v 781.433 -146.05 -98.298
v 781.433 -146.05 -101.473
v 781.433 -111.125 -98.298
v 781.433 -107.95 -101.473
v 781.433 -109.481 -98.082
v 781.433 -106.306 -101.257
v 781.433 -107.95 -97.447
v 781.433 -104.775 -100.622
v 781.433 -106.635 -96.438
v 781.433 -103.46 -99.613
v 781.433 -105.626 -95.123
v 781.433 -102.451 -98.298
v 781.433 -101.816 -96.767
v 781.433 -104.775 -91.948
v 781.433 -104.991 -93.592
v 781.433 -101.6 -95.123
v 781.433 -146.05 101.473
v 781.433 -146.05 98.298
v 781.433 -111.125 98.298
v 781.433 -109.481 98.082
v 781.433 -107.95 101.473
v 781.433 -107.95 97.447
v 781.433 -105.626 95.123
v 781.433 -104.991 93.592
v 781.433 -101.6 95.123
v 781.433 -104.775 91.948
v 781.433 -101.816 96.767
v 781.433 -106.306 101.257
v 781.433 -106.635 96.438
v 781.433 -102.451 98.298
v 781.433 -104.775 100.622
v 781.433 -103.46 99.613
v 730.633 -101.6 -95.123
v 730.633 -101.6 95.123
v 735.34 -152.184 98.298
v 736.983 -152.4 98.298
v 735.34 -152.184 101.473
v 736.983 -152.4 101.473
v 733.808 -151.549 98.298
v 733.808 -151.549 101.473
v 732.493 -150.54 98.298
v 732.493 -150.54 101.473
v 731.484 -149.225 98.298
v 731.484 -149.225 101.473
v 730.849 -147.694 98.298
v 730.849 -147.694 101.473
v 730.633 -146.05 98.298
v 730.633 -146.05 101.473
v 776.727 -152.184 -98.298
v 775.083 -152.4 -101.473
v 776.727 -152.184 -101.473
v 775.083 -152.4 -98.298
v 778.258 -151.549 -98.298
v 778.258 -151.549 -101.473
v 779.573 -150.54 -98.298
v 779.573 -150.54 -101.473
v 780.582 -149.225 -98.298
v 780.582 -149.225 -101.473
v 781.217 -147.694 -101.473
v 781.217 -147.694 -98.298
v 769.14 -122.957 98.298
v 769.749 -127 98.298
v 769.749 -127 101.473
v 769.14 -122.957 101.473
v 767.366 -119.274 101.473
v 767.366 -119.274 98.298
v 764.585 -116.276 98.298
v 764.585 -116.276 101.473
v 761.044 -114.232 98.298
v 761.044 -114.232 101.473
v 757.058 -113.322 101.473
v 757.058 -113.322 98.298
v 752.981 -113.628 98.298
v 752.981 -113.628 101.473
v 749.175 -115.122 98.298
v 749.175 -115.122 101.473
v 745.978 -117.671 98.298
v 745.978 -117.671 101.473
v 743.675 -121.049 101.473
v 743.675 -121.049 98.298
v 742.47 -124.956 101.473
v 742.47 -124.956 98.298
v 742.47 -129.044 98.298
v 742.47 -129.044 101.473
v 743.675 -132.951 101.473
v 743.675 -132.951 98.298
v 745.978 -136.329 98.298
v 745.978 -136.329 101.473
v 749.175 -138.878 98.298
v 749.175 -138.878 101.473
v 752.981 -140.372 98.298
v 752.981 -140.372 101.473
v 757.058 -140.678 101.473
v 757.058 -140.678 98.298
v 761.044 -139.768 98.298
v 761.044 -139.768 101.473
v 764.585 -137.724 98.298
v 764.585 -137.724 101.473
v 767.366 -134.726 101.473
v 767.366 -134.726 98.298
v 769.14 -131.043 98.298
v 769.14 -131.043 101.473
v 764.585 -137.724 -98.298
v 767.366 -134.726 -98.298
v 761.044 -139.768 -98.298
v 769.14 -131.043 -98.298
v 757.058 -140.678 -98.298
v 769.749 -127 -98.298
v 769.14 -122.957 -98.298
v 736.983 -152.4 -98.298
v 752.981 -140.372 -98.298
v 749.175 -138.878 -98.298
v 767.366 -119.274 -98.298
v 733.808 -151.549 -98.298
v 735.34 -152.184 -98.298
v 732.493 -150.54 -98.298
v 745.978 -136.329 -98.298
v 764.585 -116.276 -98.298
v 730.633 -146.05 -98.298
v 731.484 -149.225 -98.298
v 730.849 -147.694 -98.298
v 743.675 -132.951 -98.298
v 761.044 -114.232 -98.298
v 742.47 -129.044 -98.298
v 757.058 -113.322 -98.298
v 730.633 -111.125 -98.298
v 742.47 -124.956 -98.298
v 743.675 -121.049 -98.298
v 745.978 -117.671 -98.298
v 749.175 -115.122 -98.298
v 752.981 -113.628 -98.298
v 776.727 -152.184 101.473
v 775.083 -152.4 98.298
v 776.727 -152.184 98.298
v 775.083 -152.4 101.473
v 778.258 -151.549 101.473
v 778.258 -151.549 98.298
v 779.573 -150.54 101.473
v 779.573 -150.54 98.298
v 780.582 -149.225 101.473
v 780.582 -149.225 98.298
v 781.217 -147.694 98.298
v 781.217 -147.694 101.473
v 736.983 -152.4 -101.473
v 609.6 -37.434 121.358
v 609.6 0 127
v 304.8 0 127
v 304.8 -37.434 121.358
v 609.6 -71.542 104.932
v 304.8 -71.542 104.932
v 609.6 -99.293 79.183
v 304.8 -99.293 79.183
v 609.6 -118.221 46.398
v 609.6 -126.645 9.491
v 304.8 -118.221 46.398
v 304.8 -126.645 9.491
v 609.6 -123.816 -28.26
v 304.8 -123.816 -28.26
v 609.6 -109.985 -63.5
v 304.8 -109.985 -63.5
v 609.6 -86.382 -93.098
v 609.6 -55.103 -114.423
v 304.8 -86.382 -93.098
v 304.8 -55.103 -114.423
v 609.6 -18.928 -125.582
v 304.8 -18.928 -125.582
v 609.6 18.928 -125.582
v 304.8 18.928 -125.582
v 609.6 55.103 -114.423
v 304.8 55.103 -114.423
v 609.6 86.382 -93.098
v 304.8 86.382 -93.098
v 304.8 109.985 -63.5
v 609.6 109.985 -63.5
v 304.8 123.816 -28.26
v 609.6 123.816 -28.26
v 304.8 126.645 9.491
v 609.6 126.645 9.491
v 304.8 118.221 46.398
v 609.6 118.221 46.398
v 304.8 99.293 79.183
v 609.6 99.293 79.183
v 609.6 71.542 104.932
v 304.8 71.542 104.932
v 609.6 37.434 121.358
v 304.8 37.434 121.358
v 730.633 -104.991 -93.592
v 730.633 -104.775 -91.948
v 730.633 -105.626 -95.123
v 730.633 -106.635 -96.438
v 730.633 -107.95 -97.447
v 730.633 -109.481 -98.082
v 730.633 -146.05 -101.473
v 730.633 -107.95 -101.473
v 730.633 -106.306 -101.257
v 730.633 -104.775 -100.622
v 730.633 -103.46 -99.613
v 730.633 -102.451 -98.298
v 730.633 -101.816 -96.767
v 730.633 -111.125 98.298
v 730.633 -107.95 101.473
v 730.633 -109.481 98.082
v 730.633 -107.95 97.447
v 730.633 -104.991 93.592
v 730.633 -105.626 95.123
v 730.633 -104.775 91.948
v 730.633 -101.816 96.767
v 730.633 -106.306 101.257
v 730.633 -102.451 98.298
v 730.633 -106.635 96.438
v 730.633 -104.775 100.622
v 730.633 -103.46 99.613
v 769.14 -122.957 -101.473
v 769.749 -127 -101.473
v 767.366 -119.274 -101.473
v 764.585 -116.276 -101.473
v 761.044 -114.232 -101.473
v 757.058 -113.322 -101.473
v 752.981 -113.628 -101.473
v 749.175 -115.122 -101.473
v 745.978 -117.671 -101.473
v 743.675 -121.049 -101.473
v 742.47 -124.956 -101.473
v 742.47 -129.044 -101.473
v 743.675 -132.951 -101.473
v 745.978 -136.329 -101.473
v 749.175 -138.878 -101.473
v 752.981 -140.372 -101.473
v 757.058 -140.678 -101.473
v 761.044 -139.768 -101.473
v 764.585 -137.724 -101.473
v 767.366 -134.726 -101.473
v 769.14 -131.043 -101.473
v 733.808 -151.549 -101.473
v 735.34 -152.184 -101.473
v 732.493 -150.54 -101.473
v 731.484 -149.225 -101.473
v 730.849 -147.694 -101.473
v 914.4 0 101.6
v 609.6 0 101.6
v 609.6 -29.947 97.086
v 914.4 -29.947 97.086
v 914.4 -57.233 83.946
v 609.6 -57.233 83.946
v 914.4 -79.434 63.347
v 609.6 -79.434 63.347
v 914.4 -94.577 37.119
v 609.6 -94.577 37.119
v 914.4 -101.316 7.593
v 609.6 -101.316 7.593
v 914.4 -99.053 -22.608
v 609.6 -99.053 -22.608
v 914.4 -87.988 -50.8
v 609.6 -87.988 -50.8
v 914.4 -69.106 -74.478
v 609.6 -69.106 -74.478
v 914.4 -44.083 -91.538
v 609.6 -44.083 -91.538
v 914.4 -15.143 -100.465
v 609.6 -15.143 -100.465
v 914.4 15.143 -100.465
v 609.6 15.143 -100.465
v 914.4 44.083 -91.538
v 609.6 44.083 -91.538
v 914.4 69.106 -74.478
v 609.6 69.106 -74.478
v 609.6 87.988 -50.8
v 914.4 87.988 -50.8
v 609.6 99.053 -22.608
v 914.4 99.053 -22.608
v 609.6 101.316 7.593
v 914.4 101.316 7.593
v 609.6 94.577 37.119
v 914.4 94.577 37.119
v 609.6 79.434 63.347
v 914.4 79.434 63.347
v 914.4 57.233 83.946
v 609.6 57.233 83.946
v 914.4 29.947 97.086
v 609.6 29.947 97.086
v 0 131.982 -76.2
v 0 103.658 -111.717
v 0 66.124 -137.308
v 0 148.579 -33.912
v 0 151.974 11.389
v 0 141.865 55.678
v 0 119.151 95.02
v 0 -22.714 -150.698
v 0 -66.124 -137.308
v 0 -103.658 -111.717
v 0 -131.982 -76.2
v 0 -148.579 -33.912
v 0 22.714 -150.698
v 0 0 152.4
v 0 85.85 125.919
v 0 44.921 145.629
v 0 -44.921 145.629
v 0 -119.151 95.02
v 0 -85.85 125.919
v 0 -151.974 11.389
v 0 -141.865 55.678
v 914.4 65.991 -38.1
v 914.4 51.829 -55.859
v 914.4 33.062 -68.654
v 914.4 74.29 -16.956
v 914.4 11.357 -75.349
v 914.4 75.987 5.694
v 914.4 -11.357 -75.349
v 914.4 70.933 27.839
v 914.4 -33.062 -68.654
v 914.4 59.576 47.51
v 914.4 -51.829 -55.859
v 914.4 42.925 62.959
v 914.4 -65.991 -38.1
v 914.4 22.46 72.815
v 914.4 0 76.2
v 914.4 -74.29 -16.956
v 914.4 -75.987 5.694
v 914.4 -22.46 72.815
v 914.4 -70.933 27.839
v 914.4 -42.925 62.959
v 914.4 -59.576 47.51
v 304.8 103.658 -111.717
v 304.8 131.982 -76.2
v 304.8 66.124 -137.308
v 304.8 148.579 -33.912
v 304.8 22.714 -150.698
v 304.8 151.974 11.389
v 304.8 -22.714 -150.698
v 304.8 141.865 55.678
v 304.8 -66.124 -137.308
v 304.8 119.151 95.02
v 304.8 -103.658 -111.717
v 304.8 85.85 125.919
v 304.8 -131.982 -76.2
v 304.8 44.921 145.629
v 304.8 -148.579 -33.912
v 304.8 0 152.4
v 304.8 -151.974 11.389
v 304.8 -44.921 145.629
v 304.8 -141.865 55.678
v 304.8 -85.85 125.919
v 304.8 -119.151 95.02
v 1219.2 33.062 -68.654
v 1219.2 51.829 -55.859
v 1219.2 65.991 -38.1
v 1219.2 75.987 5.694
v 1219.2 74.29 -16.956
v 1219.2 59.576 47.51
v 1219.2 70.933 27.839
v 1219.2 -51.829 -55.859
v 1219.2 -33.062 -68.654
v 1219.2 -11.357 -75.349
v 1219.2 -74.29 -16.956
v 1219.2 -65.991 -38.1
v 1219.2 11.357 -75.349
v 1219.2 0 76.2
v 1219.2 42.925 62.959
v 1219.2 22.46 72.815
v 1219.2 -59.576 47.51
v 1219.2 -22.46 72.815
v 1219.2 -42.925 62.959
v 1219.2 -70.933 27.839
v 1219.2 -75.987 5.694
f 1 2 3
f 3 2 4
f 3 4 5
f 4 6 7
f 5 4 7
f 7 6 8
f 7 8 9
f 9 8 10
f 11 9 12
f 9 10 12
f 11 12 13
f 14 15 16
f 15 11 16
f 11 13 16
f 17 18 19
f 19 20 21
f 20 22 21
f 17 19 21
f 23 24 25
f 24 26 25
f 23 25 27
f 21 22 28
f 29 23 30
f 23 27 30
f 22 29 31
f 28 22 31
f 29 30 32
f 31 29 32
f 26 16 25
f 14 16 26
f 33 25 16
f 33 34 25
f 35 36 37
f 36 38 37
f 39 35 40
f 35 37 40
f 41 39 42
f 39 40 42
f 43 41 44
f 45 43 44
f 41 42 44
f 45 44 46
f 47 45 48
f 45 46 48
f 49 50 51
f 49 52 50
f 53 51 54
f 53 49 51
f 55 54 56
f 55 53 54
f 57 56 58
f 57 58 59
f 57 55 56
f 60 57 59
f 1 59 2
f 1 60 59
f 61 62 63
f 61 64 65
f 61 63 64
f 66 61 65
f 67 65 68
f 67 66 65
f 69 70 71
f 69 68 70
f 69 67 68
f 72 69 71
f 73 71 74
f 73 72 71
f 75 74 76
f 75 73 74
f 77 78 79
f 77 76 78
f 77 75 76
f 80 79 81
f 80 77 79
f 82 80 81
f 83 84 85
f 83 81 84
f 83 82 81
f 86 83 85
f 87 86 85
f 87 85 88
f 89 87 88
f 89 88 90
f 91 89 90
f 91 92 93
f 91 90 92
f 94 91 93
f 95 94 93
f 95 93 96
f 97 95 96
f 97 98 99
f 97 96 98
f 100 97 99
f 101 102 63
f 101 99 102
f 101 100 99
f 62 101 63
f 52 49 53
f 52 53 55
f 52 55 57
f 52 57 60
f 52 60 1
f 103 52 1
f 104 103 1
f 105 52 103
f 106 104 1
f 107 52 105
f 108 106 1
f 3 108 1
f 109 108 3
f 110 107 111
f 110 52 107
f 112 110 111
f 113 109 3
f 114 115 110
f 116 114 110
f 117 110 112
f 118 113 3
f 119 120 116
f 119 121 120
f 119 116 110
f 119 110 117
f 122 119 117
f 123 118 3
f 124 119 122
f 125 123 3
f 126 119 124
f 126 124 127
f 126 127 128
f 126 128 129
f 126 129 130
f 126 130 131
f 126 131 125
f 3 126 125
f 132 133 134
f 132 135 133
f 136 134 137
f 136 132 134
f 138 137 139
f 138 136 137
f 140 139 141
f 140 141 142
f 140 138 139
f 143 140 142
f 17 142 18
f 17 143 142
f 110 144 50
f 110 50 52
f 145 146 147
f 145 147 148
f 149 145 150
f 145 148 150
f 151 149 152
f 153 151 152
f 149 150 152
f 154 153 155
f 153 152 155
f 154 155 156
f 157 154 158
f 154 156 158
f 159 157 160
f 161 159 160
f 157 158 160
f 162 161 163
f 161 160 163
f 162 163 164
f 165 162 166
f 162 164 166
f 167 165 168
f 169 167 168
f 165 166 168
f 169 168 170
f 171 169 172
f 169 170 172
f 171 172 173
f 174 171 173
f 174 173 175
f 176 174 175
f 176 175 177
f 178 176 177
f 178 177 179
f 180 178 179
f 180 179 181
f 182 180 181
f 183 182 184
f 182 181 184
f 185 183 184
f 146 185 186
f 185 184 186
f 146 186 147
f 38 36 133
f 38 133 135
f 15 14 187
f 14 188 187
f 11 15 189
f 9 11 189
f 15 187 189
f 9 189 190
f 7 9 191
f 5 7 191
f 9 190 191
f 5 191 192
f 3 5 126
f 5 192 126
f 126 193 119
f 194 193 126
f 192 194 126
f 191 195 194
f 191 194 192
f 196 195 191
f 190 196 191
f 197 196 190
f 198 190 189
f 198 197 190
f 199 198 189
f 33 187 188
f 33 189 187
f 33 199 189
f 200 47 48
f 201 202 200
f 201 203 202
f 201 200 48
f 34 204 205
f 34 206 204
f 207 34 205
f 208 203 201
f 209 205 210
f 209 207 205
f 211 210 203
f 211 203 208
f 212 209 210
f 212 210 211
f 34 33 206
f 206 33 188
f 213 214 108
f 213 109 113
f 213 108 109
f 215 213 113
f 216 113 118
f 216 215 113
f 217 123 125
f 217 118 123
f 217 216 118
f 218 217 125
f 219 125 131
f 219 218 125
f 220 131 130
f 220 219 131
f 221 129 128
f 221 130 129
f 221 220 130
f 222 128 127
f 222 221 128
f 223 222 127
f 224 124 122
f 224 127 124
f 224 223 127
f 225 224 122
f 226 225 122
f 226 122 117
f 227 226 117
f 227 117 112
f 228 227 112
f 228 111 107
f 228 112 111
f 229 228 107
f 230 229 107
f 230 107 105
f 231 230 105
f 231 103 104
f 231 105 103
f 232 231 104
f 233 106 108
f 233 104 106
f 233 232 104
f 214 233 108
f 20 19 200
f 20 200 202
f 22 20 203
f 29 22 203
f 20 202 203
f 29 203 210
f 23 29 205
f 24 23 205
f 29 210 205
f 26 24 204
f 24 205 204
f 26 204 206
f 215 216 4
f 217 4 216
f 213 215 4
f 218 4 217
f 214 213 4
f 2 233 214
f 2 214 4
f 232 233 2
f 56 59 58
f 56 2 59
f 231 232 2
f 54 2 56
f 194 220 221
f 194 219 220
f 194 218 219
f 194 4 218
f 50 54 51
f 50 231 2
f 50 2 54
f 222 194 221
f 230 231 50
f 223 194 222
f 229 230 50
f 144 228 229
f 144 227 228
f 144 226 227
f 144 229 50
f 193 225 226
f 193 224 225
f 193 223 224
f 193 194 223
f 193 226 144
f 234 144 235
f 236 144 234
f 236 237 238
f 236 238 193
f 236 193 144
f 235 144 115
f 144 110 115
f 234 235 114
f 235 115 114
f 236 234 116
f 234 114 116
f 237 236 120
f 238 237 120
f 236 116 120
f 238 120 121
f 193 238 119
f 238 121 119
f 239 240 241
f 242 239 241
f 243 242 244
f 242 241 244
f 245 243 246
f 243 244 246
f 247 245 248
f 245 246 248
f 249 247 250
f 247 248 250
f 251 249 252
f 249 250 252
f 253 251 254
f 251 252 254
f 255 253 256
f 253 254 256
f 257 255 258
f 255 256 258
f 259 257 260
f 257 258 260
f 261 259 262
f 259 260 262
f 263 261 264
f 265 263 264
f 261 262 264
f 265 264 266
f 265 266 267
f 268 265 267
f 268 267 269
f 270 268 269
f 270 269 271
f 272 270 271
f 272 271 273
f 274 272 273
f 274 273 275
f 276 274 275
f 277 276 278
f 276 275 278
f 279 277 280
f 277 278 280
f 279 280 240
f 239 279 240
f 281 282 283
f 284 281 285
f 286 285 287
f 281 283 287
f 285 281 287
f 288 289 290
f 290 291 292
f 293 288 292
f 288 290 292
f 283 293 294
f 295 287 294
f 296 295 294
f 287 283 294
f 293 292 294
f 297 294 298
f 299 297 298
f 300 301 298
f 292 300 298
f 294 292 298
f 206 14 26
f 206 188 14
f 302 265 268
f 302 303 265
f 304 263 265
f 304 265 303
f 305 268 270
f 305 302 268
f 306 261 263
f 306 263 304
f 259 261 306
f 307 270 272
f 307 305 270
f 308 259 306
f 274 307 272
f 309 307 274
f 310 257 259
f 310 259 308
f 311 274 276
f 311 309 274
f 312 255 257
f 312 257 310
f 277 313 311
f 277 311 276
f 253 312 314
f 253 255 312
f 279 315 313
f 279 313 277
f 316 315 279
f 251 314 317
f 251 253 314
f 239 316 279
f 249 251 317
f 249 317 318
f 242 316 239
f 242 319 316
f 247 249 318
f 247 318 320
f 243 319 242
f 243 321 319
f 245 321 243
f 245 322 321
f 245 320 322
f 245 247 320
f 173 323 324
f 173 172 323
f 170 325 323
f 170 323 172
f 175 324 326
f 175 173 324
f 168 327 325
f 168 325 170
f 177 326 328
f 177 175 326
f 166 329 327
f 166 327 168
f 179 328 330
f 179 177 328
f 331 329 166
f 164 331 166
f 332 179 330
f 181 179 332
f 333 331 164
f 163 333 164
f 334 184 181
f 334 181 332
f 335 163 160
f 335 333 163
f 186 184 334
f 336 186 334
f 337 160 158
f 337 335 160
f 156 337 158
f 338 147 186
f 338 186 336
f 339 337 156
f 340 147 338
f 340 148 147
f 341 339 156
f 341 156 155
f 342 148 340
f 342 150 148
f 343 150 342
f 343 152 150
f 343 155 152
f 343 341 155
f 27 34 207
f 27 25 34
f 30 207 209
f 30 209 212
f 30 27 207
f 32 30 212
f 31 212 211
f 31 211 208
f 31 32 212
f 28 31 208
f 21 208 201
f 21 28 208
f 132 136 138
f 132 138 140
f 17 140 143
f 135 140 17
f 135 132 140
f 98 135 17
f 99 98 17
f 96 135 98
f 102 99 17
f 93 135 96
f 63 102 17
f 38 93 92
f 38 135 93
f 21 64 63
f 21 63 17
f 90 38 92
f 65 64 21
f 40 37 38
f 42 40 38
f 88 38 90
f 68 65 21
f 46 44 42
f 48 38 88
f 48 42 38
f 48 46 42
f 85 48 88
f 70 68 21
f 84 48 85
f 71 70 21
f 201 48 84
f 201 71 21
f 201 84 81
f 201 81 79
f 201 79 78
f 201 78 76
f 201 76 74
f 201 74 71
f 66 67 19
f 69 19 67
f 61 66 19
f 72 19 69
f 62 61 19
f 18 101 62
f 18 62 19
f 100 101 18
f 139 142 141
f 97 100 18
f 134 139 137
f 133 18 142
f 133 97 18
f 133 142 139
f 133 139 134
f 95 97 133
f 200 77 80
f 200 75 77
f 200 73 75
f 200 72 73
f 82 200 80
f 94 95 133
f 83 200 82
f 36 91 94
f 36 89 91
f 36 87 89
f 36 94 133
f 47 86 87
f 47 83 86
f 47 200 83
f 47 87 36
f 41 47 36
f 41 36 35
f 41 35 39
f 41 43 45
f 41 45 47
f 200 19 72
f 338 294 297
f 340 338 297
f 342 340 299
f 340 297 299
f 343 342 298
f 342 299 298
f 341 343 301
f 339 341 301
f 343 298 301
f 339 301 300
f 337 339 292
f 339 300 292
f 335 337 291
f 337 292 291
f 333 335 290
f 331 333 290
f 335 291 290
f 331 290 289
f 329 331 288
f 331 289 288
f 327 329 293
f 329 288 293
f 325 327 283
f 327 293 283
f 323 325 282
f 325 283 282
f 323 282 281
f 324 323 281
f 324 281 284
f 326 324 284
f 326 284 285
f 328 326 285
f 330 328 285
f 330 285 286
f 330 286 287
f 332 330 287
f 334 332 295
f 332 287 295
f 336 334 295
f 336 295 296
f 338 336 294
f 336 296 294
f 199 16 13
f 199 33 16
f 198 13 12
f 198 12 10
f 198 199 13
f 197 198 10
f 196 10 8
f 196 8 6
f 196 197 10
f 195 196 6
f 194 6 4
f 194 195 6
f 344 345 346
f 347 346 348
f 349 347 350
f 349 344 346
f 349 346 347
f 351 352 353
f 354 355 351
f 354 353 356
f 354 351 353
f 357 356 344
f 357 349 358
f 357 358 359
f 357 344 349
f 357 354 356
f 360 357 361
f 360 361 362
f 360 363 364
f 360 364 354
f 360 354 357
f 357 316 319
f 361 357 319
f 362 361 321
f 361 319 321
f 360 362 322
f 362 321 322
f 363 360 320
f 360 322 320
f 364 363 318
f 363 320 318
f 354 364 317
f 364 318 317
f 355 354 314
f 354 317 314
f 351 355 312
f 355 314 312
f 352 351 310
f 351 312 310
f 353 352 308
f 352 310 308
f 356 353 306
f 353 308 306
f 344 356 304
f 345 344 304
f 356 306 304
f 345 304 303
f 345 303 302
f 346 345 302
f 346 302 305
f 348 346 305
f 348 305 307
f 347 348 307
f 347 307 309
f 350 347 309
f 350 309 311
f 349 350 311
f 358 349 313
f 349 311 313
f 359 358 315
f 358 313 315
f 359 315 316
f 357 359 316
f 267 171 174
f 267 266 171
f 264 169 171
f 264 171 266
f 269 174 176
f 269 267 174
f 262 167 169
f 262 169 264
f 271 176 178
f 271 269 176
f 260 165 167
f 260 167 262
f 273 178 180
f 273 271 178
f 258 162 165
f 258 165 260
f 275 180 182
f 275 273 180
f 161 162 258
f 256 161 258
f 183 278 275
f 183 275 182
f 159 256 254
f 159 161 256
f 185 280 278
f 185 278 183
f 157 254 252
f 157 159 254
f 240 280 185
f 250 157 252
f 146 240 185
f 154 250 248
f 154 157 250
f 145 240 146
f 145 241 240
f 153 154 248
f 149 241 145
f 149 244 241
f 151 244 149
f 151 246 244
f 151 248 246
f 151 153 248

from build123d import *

# Parameters (mm, degrees)
SKETCH1_R               = 152.4
BOSS_EXTRUDE1_DEPTH     = 304.8
SKETCH2_R               = 127
BOSS_EXTRUDE2_DEPTH     = 304.8
SKETCH3_R               = 101.6
BOSS_EXTRUDE3_DEPTH     = 304.8
SKETCH4_R               = 76.2
BOSS_EXTRUDE4_DEPTH     = 304.8
BOSS_EXTRUDE6_DEPTH     = 25.4
FILLET1_R               = 6.35
CUT_EXTRUDE1_DEPTH      = 1255.641741745
CUT_EXTRUDE1_DEPTH_BACK = 1255.641741745
SKETCH7_R               = 13.716


with BuildPart() as part:
    # Sketch1 → Boss-Extrude1 (new body)
    with BuildSketch(Plane(origin=(0, 0, 0), x_dir=(0, 0, -1), z_dir=(1, 0, 0))):
        with Locations(Location((0, 0, 0), (0, 0, 180))):
            Circle(SKETCH1_R)
    extrude(amount=BOSS_EXTRUDE1_DEPTH)

    # Sketch2 → Boss-Extrude2 (add)
    with BuildSketch(Plane(origin=(304.8, 0, 0), x_dir=(0, 0, -1), z_dir=(1, 0, 0))):
        with Locations(Location((0, 0, 0), (0, 0, 180))):
            Circle(SKETCH2_R)
    extrude(amount=BOSS_EXTRUDE2_DEPTH)

    # Sketch3 → Boss-Extrude3 (add)
    with BuildSketch(Plane(origin=(609.6, 0, 0), x_dir=(0, 0, -1), z_dir=(1, 0, 0))):
        with Locations(Location((0, 0, 0), (0, 0, 180))):
            Circle(SKETCH3_R)
    extrude(amount=BOSS_EXTRUDE3_DEPTH)

    # Sketch4 → Boss-Extrude4 (add)
    with BuildSketch(Plane(origin=(914.4, 0, 0), x_dir=(0, 0, -1), z_dir=(1, 0, 0))):
        with Locations(Location((0, 0, 0), (0, 0, 180))):
            Circle(SKETCH4_R)
    extrude(amount=BOSS_EXTRUDE4_DEPTH)


with BuildPart() as body_2:
    # Sketch6 → Boss-Extrude6 (new, symmetric)
    with BuildSketch(Plane.ZY.offset(-756.033019333)):
        Polygon((101.473, -101.6), (-101.473, -101.6), (-101.473, -152.4), (-98.298, -152.4), (-98.298, -104.775), (98.298, -104.775), (98.298, -152.4), (101.473, -152.4), align=None)
    extrude(amount=BOSS_EXTRUDE6_DEPTH, both=True)

    # Fillet1
    fillet1_edges = [body_2.edges().sort_by_distance(p)[0] for p in [
        (781.433019333, -152.4, 99.8855),
        (756.033019333, -104.775, 98.298),
        (756.033019333, -104.775, -98.298),
        (756.033019333, -101.6, -101.473),
        (756.033019333, -101.6, 101.473),
        (730.633019333, -152.4, -99.8855),
        (730.633019333, -152.4, 99.8855),
        (781.433019333, -152.4, -99.8855),
    ]]
    fillet(fillet1_edges, radius=FILLET1_R)

    # Sketch7 → Cut-Extrude1 (cut, two sides: drawn at the far end of the back side and taken through both)
    with BuildSketch(Plane.XY.offset(101.473).offset(-CUT_EXTRUDE1_DEPTH_BACK)):
        with Locations((756.033019333, -127)):
            Circle(SKETCH7_R)
    extrude(amount=CUT_EXTRUDE1_DEPTH + CUT_EXTRUDE1_DEPTH_BACK, mode=Mode.SUBTRACT)


solid = Compound([part.part, body_2.part])
